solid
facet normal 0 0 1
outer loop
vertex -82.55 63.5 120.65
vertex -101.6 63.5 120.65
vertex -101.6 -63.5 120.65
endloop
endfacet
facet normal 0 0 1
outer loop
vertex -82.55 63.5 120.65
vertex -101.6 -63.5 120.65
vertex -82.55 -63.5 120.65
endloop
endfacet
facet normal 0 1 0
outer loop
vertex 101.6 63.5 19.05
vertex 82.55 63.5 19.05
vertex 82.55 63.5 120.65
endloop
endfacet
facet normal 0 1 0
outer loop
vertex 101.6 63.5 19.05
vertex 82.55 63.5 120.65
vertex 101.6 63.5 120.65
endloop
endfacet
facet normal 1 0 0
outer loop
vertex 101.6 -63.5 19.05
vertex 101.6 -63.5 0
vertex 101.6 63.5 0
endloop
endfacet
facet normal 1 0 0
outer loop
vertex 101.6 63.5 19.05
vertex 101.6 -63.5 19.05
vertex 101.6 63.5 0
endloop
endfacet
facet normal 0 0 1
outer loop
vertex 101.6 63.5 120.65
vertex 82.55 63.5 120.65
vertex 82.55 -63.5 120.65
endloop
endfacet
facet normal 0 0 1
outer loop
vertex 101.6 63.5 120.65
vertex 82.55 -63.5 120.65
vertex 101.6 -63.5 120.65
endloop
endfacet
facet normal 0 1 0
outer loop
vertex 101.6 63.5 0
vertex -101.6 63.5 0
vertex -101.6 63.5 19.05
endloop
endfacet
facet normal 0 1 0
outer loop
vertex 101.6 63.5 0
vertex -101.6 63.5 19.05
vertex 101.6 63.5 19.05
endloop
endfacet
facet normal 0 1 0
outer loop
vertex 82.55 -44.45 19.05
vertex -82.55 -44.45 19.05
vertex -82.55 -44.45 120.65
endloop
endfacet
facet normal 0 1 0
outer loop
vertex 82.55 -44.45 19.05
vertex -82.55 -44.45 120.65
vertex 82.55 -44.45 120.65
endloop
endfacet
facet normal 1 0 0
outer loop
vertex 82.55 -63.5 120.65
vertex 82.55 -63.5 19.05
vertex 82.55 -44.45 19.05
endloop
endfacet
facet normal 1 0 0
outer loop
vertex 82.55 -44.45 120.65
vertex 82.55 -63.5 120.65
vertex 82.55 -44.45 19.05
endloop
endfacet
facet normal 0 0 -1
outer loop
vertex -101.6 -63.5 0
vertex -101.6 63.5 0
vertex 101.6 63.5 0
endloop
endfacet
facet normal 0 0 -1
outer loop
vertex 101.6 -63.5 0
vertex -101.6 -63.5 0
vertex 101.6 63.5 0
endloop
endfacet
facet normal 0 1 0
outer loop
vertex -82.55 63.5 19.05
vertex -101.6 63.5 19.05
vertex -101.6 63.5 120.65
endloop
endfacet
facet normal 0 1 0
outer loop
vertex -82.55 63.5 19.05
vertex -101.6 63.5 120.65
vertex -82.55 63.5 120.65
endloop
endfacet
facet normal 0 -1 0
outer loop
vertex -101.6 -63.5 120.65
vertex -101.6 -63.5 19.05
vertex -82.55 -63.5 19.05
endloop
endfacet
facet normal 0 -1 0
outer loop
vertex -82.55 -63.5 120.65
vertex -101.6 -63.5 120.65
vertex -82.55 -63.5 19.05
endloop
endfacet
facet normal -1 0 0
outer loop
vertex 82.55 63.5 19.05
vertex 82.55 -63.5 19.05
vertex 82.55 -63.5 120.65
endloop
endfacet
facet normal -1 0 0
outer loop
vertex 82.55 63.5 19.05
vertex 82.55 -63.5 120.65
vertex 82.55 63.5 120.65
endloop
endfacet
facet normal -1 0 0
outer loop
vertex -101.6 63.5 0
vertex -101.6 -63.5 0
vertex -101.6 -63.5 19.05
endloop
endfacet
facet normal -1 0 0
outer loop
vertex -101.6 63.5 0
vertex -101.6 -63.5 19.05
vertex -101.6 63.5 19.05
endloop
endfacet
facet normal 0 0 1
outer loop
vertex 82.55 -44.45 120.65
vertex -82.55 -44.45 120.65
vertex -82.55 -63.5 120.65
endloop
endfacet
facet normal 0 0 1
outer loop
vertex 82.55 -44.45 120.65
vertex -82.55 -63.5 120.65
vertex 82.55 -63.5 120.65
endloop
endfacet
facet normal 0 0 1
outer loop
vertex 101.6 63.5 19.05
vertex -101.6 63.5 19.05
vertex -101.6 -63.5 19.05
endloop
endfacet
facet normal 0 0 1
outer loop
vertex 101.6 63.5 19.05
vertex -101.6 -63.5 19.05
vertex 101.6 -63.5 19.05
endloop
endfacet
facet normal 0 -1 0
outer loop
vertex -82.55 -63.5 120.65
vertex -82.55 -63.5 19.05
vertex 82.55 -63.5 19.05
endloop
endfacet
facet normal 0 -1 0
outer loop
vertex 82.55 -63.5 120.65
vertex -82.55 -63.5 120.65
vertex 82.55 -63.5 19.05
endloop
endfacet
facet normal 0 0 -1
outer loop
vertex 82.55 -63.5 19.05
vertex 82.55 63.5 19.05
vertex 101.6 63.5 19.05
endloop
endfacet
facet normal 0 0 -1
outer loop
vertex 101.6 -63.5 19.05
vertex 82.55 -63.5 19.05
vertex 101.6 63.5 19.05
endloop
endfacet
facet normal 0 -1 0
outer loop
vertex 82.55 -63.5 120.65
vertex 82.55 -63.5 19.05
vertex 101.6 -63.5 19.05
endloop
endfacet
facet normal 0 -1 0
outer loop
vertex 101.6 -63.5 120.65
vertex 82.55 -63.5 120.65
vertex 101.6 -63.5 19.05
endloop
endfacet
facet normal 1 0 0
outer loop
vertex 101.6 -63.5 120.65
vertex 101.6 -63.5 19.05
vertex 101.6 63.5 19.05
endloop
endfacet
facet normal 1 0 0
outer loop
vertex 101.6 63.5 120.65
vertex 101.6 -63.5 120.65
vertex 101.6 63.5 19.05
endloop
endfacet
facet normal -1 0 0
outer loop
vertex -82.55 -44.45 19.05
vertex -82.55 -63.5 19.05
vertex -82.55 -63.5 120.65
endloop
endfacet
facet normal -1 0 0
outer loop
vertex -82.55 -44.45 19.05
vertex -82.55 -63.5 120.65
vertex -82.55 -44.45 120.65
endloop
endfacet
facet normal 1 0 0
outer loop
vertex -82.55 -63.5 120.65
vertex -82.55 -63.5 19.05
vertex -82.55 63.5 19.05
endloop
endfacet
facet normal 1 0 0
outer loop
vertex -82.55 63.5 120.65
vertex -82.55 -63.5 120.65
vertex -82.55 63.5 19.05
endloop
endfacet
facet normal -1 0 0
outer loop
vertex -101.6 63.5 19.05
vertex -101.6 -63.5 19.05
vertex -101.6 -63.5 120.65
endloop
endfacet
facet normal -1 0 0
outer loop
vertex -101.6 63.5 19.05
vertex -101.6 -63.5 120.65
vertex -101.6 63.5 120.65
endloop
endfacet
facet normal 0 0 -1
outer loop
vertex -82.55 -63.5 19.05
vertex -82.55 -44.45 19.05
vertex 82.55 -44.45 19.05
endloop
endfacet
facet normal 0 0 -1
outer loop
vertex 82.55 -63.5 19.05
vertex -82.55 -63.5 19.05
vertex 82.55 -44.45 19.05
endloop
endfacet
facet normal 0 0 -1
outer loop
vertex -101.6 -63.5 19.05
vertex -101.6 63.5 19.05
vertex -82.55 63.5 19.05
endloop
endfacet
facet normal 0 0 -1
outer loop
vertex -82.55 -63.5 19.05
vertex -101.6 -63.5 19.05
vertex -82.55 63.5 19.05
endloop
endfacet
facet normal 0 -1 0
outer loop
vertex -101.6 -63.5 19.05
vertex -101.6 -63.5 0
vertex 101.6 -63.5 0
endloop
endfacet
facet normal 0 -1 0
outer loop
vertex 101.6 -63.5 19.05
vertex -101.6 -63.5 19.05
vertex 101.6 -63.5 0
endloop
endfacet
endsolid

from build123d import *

# Parameters (mm, degrees)
F0_W     = 203.2
F0_H     = 127
F1_DEPTH = 19.05
F2_W     = 19.05
F2_H     = 127
F3_DEPTH = 101.6
F4_W     = 165.1
F4_H     = 19.05
F5_DEPTH = 101.6


with BuildPart() as f1:
    # F0 (on Top) → F1 (new body)
    with BuildSketch(Plane.XY):
        Rectangle(F0_W, F0_H)
    extrude(amount=F1_DEPTH)


with BuildPart() as f3:
    # F2 (on face) → F3 (new body)
    with BuildSketch(Plane.XY.offset(19.05)):
        with Locations((-92.075, 0)):
            Rectangle(F2_W, F2_H)
        with Locations((92.075, 0)):
            Rectangle(F2_W, F2_H)
    extrude(amount=F3_DEPTH)


with BuildPart() as f5:
    # F4 (on face) → F5 (new body, through all)
    with BuildSketch(Plane.XY.offset(19.05)):
        with Locations((0, -53.975)):
            Rectangle(F4_W, F4_H)
    extrude(amount=F5_DEPTH)


solid = Compound([f1.part, f3.part, f5.part])
